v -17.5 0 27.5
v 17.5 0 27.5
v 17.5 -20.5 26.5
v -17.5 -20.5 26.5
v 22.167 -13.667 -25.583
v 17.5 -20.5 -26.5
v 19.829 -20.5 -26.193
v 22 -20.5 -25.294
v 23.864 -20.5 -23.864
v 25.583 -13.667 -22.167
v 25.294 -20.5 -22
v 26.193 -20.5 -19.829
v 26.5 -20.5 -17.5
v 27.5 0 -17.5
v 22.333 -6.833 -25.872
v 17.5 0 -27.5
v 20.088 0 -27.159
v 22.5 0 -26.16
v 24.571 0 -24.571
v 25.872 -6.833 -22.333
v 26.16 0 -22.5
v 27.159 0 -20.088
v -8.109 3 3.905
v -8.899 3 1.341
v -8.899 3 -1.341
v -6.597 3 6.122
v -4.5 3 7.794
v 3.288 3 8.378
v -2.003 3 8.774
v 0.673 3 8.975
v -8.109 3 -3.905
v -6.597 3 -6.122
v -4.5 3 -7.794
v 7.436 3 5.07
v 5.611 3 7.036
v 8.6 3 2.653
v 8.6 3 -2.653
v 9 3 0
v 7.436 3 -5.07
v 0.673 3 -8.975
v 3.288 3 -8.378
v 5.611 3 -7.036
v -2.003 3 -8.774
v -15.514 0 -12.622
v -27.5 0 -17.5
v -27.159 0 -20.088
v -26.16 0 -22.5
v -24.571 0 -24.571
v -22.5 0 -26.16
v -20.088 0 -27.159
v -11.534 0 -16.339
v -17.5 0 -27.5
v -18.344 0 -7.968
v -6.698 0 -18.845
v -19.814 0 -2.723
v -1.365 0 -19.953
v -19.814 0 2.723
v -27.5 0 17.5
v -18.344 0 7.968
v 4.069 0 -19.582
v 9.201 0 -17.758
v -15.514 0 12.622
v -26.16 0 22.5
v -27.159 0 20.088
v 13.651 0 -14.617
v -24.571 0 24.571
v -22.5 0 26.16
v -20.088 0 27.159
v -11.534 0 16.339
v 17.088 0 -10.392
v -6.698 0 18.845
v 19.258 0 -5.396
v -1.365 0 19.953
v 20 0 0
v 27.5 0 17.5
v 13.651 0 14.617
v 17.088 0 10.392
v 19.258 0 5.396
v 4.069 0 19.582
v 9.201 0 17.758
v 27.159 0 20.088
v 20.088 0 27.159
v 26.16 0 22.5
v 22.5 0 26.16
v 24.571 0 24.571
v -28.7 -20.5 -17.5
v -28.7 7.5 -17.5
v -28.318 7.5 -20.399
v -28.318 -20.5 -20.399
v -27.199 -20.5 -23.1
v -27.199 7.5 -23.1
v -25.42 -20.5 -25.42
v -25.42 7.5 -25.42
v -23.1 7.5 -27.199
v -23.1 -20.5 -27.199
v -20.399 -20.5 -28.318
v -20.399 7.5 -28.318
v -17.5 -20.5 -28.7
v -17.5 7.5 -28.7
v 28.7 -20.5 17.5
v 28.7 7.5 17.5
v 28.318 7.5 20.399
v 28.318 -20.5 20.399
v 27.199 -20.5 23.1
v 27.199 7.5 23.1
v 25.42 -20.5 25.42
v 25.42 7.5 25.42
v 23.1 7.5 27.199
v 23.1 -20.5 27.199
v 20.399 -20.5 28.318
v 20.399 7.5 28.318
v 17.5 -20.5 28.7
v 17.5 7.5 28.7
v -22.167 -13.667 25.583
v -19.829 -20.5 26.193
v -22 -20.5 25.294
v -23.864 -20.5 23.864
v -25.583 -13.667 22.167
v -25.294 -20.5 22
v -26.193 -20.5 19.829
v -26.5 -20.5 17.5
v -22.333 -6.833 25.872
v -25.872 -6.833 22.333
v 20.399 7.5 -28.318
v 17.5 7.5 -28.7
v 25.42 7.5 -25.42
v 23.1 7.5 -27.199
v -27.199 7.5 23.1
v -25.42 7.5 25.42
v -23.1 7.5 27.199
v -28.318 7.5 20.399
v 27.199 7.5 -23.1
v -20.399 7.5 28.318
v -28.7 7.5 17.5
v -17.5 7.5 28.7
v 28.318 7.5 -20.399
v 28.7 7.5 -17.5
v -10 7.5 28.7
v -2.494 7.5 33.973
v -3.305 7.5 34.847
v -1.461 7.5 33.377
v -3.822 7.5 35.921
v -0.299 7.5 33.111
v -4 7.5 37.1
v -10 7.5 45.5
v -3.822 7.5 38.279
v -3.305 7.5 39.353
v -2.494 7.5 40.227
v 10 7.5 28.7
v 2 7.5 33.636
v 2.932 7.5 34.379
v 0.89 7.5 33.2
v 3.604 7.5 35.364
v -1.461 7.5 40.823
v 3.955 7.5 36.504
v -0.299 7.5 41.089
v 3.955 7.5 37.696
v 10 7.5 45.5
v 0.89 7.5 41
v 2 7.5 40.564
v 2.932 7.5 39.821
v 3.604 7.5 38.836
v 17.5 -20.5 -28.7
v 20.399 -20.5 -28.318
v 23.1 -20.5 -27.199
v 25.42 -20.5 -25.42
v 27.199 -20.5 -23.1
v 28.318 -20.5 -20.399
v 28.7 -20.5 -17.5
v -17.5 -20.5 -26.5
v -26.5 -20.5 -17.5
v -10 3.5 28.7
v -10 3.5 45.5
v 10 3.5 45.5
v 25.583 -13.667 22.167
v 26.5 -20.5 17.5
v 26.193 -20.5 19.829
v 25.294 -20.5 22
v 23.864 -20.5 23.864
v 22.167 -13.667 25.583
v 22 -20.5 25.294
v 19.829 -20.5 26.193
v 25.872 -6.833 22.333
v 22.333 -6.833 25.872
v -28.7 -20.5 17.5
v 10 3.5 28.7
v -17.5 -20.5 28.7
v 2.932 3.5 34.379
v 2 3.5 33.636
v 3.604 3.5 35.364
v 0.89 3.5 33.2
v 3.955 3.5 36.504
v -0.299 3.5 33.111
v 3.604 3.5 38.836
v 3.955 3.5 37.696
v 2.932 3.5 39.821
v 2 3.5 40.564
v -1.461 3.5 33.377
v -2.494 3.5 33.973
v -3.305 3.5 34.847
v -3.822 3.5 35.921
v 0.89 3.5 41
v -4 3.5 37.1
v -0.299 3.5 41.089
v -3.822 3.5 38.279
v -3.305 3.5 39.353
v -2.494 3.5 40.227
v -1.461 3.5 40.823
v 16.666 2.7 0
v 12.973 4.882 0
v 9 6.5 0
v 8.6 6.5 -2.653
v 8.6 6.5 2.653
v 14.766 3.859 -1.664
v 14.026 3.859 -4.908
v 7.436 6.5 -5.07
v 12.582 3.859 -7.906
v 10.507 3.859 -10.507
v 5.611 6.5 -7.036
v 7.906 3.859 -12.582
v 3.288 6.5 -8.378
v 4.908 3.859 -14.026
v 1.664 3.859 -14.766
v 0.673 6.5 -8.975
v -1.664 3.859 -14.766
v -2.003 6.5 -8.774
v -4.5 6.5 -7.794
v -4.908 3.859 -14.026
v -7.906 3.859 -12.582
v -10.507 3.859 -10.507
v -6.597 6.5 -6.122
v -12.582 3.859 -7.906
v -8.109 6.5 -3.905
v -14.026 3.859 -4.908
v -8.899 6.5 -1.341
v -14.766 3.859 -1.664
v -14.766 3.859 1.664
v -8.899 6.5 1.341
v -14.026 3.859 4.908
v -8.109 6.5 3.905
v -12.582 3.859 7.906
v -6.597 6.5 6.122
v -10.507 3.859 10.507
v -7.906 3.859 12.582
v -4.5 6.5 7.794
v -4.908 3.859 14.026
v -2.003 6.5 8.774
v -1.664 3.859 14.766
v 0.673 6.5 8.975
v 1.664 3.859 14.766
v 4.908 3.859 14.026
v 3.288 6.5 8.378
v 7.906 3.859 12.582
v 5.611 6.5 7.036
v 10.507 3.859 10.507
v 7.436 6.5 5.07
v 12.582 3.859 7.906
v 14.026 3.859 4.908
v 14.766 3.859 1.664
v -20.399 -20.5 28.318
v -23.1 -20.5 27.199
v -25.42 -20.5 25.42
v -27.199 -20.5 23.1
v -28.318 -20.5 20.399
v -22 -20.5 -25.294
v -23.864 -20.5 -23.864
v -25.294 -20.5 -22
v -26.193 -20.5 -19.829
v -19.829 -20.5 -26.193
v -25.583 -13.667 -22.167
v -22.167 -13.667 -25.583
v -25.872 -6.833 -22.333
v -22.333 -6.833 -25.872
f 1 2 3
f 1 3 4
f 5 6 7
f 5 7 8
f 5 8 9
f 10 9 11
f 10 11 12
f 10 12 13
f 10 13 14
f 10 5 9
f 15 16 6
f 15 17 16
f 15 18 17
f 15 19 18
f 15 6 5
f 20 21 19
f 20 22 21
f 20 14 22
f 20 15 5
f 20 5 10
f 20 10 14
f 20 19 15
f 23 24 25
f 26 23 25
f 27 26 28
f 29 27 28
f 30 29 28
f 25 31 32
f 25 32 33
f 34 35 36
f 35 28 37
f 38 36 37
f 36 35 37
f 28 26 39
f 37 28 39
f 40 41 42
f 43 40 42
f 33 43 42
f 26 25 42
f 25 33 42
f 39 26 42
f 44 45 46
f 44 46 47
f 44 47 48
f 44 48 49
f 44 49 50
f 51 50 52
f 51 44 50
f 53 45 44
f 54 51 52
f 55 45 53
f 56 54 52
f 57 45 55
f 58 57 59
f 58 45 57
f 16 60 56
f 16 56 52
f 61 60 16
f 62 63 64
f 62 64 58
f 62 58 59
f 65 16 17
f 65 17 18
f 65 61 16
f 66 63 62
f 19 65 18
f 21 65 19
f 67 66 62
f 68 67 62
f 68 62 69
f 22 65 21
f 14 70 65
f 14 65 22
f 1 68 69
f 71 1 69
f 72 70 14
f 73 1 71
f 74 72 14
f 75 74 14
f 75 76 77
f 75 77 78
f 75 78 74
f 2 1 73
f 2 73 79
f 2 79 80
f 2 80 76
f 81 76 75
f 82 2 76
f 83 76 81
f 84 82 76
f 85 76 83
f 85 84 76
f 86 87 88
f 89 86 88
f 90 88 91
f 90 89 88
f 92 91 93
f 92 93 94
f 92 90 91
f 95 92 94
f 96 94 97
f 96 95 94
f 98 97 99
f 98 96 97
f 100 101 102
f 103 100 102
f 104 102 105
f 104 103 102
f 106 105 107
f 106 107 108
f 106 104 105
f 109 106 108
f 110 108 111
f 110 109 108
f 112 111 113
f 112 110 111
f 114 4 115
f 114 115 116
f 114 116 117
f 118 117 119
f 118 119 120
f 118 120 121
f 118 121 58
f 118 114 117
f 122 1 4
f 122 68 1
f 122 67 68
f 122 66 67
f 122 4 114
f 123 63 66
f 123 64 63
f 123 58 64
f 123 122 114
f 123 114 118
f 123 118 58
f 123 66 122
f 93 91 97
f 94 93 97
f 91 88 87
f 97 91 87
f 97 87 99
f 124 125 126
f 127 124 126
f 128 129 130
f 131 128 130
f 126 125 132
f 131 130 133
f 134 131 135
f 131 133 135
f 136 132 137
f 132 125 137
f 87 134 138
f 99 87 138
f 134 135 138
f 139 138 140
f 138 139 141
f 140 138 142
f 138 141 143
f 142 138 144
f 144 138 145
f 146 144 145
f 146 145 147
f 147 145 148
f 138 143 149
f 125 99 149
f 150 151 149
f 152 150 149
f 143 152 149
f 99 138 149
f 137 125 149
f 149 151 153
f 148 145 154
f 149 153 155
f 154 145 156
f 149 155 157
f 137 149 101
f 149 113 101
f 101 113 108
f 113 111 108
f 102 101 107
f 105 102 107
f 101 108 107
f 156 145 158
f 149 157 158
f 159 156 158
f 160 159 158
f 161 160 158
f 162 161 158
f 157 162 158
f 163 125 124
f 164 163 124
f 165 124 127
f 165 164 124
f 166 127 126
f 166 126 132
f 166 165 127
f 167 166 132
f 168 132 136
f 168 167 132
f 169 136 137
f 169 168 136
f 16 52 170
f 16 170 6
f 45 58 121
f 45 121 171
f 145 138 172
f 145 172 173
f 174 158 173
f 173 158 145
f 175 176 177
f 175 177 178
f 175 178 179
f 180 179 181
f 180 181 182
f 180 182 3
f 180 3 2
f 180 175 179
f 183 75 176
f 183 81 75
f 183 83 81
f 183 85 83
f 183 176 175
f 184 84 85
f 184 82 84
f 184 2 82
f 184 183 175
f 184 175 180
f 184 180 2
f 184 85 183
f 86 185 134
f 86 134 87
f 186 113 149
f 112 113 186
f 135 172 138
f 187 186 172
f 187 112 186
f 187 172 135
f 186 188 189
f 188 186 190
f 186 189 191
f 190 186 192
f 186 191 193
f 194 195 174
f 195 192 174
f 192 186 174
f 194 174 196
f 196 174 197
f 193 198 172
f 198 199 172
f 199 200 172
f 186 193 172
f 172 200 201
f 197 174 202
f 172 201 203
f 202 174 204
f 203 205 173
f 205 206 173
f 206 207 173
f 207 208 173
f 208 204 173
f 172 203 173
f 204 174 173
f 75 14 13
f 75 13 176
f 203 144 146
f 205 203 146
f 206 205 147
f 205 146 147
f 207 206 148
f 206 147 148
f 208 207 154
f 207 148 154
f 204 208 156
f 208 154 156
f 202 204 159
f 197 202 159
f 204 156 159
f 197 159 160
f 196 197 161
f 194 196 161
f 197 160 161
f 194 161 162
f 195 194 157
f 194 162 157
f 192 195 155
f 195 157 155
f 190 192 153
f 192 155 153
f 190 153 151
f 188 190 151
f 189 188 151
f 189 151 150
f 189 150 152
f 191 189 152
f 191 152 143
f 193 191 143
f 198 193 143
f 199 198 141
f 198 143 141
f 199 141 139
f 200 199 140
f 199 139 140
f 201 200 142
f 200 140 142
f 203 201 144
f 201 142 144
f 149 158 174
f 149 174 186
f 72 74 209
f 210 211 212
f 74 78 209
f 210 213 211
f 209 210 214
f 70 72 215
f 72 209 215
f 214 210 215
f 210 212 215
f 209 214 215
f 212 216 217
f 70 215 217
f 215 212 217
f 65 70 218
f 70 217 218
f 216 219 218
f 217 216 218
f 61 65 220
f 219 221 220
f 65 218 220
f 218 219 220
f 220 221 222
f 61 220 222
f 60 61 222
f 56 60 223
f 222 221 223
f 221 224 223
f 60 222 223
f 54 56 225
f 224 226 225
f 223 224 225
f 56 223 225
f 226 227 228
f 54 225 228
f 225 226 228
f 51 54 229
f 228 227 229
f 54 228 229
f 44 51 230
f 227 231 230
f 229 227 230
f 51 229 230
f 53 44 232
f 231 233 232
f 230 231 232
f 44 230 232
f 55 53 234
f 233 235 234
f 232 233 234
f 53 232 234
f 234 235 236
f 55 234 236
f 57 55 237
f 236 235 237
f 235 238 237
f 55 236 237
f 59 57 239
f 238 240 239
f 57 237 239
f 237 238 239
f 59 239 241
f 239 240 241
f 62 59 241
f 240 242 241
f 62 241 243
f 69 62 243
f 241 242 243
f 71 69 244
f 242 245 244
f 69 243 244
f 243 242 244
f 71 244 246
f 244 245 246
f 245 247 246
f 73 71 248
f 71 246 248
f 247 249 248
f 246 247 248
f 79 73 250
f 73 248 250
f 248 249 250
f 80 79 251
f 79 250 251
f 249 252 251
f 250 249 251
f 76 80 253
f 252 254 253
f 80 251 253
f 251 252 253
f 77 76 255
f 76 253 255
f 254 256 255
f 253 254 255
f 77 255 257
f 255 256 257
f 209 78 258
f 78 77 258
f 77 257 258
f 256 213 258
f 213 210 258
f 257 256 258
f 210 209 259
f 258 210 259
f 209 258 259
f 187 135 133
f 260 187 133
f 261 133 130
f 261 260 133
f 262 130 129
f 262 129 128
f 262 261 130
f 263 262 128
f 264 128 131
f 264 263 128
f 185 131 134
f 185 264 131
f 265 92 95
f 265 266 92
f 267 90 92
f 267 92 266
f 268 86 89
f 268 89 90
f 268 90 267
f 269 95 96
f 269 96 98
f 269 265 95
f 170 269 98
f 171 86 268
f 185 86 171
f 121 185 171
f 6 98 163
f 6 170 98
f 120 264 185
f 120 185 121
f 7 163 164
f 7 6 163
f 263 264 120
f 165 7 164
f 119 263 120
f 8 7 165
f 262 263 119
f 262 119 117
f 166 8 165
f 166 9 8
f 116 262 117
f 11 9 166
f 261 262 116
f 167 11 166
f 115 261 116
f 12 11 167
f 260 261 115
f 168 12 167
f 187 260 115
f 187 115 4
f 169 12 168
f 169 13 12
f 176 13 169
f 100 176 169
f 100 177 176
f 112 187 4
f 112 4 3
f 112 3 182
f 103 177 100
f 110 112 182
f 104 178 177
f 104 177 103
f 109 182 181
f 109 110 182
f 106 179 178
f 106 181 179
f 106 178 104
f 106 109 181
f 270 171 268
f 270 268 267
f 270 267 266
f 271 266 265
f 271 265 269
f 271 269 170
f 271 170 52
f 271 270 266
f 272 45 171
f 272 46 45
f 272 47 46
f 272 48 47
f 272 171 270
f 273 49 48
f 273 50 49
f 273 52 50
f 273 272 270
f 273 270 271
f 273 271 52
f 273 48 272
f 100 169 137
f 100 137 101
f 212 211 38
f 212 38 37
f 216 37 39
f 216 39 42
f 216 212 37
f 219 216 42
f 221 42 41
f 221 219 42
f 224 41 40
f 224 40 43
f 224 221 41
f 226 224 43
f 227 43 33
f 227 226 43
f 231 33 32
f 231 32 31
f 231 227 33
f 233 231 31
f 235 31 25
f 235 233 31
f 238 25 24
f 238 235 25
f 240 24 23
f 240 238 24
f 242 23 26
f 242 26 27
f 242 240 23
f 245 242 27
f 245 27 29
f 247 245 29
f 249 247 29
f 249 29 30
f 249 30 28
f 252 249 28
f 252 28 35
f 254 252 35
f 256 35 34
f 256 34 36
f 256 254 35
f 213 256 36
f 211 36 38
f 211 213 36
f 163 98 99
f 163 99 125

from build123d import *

# Parameters (mm, degrees)
F0_R      = 20
F0_R_2    = 9
F2_DEPTH  = 20.5
F3_SIZE2  = 20.49999
F3_SIZE   = 0.99999
F5_DEPTH  = 3.5
F7_DEPTH  = 28
F9_W      = 20
F9_H      = 8.2
F9_H_2    = 16.8
F9_R      = 4
F10_DEPTH = 4


# Not quite as in the source:
# - a fillet or chamfer is up to 0.001 mm smaller than in the source, because OpenCascade refuses the exact size
# - a feature names something its author has since deleted; it is built from what else it names


with BuildPart() as f2:
    # F0 (on Front) → F2 (new body)
    with BuildSketch(Plane.XZ):
        with BuildLine():
            Line((-17.5, -27.5), (17.5, -27.5))
            ThreePointArc((17.5, -27.5), (24.5710678119, -24.5710678119), (27.5, -17.5))
            Line((27.5, -17.5), (27.5, 17.5))
            ThreePointArc((27.5, 17.5), (24.5710678119, 24.5710678119), (17.5, 27.5))
            Line((17.5, 27.5), (-17.5, 27.5))
            ThreePointArc((-17.5, 27.5), (-24.5710678119, 24.5710678119), (-27.5, 17.5))
            Line((-27.5, 17.5), (-27.5, -17.5))
            ThreePointArc((-27.5, -17.5), (-24.5710678119, -24.5710678119), (-17.5, -27.5))
        make_face()
        with BuildLine():
            ThreePointArc((17.5, 26.5), (23.8639610307, 23.8639610307), (26.5, 17.5))
            Line((26.5, 17.5), (26.5, -17.5))
            ThreePointArc((26.5, -17.5), (23.8639610307, -23.8639610307), (17.5, -26.5))
            Line((17.5, -26.5), (-17.5, -26.5))
            ThreePointArc((-17.5, -26.5), (-23.8639610307, -23.8639610307), (-26.5, -17.5))
            Line((-26.5, -17.5), (-26.5, 17.5))
            ThreePointArc((-26.5, 17.5), (-23.8639610307, 23.8639610307), (-17.5, 26.5))
            Line((-17.5, 26.5), (17.5, 26.5))
        make_face(mode=Mode.SUBTRACT)
        with BuildLine():
            Line((26.5, -17.5), (26.5, 17.5))
            ThreePointArc((26.5, 17.5), (23.8639610307, 23.8639610307), (17.5, 26.5))
            Line((17.5, 26.5), (-17.5, 26.5))
            ThreePointArc((-17.5, 26.5), (-23.8639610307, 23.8639610307), (-26.5, 17.5))
            Line((-26.5, 17.5), (-26.5, -17.5))
            ThreePointArc((-26.5, -17.5), (-23.8639610307, -23.8639610307), (-17.5, -26.5))
            Line((-17.5, -26.5), (17.5, -26.5))
            ThreePointArc((17.5, -26.5), (23.8639610307, -23.8639610307), (26.5, -17.5))
        make_face()
        with BuildLine():
            ThreePointArc((17.5, 25.5), (23.1568542495, 23.1568542495), (25.5, 17.5))
            Line((25.5, 17.5), (25.5, -17.5))
            ThreePointArc((25.5, -17.5), (23.1568542495, -23.1568542495), (17.5, -25.5))
            Line((17.5, -25.5), (-17.5, -25.5))
            ThreePointArc((-17.5, -25.5), (-23.1568542495, -23.1568542495), (-25.5, -17.5))
            Line((-25.5, -17.5), (-25.5, 17.5))
            ThreePointArc((-25.5, 17.5), (-23.1568542495, 23.1568542495), (-17.5, 25.5))
            Line((-17.5, 25.5), (17.5, 25.5))
        make_face(mode=Mode.SUBTRACT)
        with BuildLine():
            Line((25.5, -17.5), (25.5, 17.5))
            ThreePointArc((25.5, 17.5), (23.1568542495, 23.1568542495), (17.5, 25.5))
            Line((17.5, 25.5), (-17.5, 25.5))
            ThreePointArc((-17.5, 25.5), (-23.1568542495, 23.1568542495), (-25.5, 17.5))
            Line((-25.5, 17.5), (-25.5, -17.5))
            ThreePointArc((-25.5, -17.5), (-23.1568542495, -23.1568542495), (-17.5, -25.5))
            Line((-17.5, -25.5), (17.5, -25.5))
            ThreePointArc((17.5, -25.5), (23.1568542495, -23.1568542495), (25.5, -17.5))
        make_face()
        Circle(F0_R, mode=Mode.SUBTRACT)
        Circle(F0_R)
        Circle(F0_R_2, mode=Mode.SUBTRACT)
        Circle(F0_R_2)
    extrude(amount=F2_DEPTH)

    # F3 (size 1 and 20.5 in the source; OpenCascade refuses exactly that, so slightly less here)
    f3_edges = [f2.edges().sort_by_distance(p)[0] for p in [
        (0, -20.5, -27.5),
        (24.571068, -20.5, -24.571068),
        (27.5, -20.5, 0),
        (24.571068, -20.5, 24.571068),
        (0, -20.5, 27.5),
        (-24.571068, -20.5, 24.571068),
        (-27.5, -20.5, 0),
        (-24.571068, -20.5, -24.571068),
    ]]
    f3_side = f2.faces().sort_by_distance((0, -20.5, 0))[0]
    chamfer(f3_edges, length=F3_SIZE, length2=F3_SIZE2, reference=f3_side)

    # F1 (on Top) → F4 (revolve)
    with BuildSketch(Plane.XY):
        with BuildLine():
            Line((9, 0), (20, 0))
            ThreePointArc((20, 0), (14.8597611017, 3.8588264798), (9, 6.5))
            Line((9, 6.5), (0, 6.5))
            Line((0, 6.5), (0, 0))
            Line((0, 0), (9, 0))
        make_face()
    revolve(axis=Axis((0, 3.25, 0), (0, 1, 0)))

    # F5 (cut): a face of the model
    f5_faces = [f2.faces().sort_by_distance(p)[0] for p in [
        (0, 6.5, 0),
    ]]
    extrude(f5_faces, amount=-F5_DEPTH, mode=Mode.SUBTRACT)


with BuildPart() as f7:
    # F6 (on face) → F7 (new body)
    with BuildSketch(Plane.XZ.offset(20.5)):
        with BuildLine():
            Line((-28.7, 17.5), (-28.7, -17.5))
            ThreePointArc((-28.7, -17.5), (-25.4195959493, -25.4195959493), (-17.5, -28.7))
            Line((-17.5, -28.7), (17.5, -28.7))
            ThreePointArc((17.5, -28.7), (25.4195959493, -25.4195959493), (28.7, -17.5))
            Line((28.7, -17.5), (28.7, 17.5))
            ThreePointArc((28.7, 17.5), (25.4195959493, 25.4195959493), (17.5, 28.7))
            Line((17.5, 28.7), (-17.5, 28.7))
            ThreePointArc((-17.5, 28.7), (-25.4195959493, 25.4195959493), (-28.7, 17.5))
        make_face()
        with BuildLine():
            Line((17.5, -26.50001), (-17.5, -26.50001))
            ThreePointArc((-17.5, -26.50001), (-23.8639681017, -23.8639681017), (-26.50001, -17.5))
            Line((-26.50001, -17.5), (-26.50001, 17.5))
            ThreePointArc((-26.50001, 17.5), (-23.8639681017, 23.8639681017), (-17.5, 26.50001))
            Line((-17.5, 26.50001), (17.5, 26.50001))
            ThreePointArc((17.5, 26.50001), (23.8639681017, 23.8639681017), (26.50001, 17.5))
            Line((26.50001, 17.5), (26.50001, -17.5))
            ThreePointArc((26.50001, -17.5), (23.8639681017, -23.8639681017), (17.5, -26.50001))
        make_face(mode=Mode.SUBTRACT)
        with BuildLine():
            ThreePointArc((-26.50001, -17.5), (-23.8639681017, -23.8639681017), (-17.5, -26.50001))
            Line((-17.5, -26.50001), (17.5, -26.50001))
            ThreePointArc((17.5, -26.50001), (23.8639681017, -23.8639681017), (26.50001, -17.5))
            Line((26.50001, -17.5), (26.50001, 17.5))
            ThreePointArc((26.50001, 17.5), (23.8639681017, 23.8639681017), (17.5, 26.50001))
            Line((17.5, 26.50001), (-17.5, 26.50001))
            ThreePointArc((-17.5, 26.50001), (-23.8639681017, 23.8639681017), (-26.50001, 17.5))
            Line((-26.50001, 17.5), (-26.50001, -17.5))
        make_face()
    extrude(amount=-F7_DEPTH)

    # F8: cut F2
    add(f2.part, mode=Mode.SUBTRACT)

    # F9 (on face) → F10 (join)
    with BuildSketch(Plane(origin=(0, 7.5, 0), x_dir=(-1, 0, 0), z_dir=(0, 1, 0))):
        with Locations((0, 24.6)):
            Rectangle(F9_W, F9_H)
        with Locations((0, 37.1)):
            Rectangle(F9_W, F9_H_2)
        with Locations((0, 37.1)):
            Circle(F9_R, mode=Mode.SUBTRACT)
    extrude(amount=-F10_DEPTH)


solid = f7.part
